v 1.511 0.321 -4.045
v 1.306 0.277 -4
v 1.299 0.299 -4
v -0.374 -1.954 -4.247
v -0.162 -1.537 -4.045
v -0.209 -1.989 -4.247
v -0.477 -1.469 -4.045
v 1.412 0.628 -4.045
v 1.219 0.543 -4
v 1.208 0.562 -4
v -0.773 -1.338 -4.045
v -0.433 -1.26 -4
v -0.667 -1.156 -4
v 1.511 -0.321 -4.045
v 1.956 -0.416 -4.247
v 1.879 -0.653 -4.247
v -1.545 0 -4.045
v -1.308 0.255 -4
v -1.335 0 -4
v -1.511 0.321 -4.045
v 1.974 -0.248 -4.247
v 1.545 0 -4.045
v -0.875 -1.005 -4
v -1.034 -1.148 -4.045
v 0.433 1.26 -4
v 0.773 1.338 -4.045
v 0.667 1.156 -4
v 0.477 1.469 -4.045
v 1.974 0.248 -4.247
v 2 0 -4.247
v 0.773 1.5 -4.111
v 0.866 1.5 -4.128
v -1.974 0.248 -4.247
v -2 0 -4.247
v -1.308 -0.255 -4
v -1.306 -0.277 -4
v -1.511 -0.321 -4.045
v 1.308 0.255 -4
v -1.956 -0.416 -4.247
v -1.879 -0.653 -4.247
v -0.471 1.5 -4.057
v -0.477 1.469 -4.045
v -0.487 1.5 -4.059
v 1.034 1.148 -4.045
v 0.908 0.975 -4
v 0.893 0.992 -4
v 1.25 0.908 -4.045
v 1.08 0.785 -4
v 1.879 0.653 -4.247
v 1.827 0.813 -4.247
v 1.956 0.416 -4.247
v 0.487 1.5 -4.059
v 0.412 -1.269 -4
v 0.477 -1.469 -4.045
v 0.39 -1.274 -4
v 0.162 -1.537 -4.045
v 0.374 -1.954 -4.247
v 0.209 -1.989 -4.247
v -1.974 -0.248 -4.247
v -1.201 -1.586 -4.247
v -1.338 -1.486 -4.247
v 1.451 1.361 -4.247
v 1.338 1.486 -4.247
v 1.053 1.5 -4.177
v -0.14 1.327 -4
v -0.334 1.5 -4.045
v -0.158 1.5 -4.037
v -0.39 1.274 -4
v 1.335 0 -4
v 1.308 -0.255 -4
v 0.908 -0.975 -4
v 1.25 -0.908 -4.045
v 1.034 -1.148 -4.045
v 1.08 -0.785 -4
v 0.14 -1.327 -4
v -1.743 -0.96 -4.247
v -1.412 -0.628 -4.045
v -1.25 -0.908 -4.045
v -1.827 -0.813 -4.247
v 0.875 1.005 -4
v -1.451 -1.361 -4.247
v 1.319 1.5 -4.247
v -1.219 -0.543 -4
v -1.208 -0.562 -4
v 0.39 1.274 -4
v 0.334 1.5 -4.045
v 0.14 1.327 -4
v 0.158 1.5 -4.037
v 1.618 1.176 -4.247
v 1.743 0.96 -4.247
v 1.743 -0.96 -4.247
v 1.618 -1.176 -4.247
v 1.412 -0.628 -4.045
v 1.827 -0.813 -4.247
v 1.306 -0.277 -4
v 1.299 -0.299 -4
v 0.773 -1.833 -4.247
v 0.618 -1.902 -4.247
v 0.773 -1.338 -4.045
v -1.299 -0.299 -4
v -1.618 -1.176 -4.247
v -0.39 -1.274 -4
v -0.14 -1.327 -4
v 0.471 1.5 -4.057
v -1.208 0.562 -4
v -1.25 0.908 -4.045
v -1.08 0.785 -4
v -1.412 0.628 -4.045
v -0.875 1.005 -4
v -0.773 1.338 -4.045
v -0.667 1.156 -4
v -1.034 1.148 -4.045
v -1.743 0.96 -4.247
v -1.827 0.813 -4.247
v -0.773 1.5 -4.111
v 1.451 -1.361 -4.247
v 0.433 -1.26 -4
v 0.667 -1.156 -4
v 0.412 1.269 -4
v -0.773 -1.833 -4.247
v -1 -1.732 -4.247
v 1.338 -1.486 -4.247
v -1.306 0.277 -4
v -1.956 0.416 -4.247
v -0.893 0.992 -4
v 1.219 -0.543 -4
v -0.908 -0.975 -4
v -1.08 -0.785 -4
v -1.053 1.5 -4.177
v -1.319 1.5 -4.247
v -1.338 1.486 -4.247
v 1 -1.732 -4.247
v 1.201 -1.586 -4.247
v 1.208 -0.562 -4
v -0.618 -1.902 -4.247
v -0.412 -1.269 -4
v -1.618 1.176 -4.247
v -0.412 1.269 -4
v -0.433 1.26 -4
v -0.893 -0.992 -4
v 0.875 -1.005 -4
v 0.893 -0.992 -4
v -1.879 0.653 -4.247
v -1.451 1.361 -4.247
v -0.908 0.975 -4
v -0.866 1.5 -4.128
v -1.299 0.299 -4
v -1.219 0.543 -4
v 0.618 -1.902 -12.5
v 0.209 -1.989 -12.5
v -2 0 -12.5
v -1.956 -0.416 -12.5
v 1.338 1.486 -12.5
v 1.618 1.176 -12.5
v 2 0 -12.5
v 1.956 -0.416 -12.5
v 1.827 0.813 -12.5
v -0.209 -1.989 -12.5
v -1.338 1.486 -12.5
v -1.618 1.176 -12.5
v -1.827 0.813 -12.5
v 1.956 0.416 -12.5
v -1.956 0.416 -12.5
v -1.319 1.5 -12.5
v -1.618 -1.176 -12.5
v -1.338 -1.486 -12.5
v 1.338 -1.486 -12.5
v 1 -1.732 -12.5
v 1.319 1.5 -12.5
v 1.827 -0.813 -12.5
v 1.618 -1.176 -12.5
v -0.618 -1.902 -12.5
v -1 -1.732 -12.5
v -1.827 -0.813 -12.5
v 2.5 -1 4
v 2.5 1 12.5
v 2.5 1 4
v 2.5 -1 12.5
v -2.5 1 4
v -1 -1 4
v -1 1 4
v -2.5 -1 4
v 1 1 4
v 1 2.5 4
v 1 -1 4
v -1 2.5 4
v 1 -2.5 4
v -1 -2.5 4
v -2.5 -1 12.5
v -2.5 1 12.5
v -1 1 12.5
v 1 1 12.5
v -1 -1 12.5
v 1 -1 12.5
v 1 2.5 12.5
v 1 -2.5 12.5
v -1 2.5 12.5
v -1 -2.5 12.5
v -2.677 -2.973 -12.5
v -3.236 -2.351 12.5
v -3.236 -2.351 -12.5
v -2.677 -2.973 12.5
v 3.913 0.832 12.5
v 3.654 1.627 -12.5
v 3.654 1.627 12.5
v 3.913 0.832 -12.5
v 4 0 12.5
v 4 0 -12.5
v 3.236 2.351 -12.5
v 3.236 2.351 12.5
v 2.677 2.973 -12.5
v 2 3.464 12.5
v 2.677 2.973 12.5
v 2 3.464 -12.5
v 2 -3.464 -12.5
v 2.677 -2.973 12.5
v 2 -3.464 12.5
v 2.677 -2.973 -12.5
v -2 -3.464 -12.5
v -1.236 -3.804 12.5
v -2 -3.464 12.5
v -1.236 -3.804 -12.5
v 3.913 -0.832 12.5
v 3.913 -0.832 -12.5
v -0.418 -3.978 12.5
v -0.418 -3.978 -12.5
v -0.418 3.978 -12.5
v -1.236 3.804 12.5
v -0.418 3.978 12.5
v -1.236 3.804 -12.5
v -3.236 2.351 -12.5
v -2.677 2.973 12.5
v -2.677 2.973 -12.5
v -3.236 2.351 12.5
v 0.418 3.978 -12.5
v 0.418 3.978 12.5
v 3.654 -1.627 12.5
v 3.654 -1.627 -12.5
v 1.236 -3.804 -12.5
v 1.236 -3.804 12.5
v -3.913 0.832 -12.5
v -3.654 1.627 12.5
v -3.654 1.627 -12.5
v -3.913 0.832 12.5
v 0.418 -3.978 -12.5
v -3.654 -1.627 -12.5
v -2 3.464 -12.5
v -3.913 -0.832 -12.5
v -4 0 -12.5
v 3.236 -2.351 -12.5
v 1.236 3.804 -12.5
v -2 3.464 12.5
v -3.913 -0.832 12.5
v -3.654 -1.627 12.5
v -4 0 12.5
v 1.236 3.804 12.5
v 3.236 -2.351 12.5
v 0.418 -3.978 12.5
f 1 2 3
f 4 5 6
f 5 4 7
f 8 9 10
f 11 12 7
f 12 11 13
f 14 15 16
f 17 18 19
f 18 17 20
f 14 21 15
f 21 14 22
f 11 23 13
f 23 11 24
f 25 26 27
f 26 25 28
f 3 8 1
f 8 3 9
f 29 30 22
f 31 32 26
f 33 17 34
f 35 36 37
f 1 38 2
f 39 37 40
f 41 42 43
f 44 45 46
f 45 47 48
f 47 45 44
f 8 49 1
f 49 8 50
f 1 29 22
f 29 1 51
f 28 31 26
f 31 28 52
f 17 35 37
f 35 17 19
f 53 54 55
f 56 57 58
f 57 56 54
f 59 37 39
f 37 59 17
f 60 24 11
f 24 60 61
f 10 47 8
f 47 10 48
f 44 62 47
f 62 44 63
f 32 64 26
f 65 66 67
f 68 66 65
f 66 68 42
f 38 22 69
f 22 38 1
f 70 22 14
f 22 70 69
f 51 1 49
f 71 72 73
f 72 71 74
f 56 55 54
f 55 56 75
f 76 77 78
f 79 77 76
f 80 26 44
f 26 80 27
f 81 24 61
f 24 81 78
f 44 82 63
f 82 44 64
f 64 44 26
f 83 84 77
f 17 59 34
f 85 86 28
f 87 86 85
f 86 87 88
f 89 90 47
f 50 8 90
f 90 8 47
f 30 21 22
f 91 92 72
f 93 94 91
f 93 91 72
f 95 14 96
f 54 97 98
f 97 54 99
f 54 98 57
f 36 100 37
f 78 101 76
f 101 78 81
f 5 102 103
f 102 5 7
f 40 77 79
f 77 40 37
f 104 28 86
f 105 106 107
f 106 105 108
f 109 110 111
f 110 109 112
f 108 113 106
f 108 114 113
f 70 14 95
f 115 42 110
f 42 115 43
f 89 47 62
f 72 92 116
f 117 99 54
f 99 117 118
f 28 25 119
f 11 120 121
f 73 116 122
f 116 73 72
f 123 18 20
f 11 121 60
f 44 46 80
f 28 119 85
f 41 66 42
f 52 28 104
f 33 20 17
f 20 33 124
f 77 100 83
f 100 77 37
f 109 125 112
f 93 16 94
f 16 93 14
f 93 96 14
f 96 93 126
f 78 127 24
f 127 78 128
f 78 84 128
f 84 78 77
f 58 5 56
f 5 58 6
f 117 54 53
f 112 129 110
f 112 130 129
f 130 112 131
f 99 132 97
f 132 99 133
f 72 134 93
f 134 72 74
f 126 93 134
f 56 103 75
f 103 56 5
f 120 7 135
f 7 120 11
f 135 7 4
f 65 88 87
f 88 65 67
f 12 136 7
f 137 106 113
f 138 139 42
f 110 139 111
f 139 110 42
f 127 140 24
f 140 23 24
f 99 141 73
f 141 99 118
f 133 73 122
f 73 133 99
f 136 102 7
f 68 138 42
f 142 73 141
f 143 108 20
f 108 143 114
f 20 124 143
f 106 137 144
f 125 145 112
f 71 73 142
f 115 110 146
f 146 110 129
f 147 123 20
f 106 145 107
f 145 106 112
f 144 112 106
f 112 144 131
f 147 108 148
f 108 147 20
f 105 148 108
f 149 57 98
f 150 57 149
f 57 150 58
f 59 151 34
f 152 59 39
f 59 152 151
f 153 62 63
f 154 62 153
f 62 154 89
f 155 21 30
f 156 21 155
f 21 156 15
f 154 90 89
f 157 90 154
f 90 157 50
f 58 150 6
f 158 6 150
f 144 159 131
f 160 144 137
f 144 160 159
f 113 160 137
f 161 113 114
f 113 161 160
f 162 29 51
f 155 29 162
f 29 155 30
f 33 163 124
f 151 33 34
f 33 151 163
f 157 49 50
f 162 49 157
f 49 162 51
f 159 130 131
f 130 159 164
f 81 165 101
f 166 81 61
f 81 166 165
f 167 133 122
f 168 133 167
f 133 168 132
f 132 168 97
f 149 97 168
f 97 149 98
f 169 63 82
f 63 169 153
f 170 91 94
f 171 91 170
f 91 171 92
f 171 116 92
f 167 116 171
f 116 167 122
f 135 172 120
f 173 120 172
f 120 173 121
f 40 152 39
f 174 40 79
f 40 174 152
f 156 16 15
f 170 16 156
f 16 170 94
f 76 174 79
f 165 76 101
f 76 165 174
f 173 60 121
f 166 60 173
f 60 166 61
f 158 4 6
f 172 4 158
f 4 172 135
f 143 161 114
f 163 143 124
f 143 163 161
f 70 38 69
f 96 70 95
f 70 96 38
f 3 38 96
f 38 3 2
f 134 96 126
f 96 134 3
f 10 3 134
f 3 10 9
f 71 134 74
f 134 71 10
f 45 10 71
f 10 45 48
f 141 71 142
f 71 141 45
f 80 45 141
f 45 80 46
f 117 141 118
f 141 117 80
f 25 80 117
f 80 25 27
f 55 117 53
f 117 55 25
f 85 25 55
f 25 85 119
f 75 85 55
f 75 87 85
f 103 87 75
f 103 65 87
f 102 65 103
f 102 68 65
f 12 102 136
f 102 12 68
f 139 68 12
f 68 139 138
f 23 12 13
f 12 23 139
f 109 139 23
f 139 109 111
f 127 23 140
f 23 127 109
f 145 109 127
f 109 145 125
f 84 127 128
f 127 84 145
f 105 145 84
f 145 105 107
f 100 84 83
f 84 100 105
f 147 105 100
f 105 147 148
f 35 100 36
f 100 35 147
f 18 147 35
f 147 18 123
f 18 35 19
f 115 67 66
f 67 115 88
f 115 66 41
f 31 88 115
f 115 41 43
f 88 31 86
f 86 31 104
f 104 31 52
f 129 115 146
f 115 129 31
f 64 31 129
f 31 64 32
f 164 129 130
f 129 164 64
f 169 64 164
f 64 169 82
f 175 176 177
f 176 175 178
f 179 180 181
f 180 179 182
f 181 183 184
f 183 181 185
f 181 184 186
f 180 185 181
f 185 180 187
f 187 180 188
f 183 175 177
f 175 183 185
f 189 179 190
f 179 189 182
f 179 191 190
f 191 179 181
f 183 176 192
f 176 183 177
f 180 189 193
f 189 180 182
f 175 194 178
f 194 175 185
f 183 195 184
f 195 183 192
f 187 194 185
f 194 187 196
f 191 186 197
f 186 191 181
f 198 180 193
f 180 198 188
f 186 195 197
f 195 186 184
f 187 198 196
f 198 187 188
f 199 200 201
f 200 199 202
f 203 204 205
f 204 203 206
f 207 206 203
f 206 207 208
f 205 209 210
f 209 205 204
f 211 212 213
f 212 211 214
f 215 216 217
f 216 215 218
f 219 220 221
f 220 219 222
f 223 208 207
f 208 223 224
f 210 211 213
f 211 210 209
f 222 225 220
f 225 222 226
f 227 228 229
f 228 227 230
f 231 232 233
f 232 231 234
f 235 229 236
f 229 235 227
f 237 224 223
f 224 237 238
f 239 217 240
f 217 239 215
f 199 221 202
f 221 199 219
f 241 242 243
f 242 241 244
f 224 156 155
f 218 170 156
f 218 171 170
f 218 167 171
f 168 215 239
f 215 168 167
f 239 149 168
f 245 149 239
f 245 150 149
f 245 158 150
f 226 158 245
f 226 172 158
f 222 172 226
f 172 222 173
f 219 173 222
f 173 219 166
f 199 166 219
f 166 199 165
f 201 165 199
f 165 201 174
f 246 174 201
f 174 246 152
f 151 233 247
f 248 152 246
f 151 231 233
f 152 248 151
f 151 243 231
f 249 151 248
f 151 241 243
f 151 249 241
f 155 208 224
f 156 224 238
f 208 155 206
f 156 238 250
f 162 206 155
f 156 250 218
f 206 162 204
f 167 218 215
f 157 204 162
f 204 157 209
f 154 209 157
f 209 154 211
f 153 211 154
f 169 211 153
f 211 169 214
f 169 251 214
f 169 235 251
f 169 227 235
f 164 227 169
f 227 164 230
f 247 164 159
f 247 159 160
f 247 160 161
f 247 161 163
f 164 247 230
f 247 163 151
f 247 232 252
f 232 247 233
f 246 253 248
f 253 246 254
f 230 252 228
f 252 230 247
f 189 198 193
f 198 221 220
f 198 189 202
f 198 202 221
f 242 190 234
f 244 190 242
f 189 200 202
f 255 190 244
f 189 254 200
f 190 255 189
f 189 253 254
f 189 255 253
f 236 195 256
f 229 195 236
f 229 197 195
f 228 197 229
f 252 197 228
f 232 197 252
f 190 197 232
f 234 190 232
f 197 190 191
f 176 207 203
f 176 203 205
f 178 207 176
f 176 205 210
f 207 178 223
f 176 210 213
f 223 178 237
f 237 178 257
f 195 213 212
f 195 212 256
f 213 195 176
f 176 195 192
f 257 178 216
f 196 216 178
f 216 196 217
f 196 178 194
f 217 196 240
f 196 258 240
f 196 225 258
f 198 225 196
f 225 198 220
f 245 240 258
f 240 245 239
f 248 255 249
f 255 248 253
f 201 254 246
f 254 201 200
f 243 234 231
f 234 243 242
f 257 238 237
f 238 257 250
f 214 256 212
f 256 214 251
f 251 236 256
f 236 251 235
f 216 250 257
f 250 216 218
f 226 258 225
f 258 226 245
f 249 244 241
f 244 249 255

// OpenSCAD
// file: ../../external/Openscad_Lego-Like_brick/block-remix.scad
// original from: http://www.thingiverse.com/thing:5699
// edited 2/24/11 3:29 PM 

// my derivation (made around 2011-06-21)
// added hollow_knob parameter to make knobs hollow
// added circular_hole parameter to make circular holes like in standard Technic plates
// added flat_top parameter to get rid of the knobs and add a groove to the bottom, so that the blocks could be separated
// 1xN and Nx1 bricks have their no pins when reinforcement==false

// EXAMPLES:
//   standard LEGO 2x1 tile has no pin
//      block(1,2,1/3,reinforcement=false,flat_top=true);
//   standard LEGO 2x1 flat has pin
//      block(1,2,1/3,reinforcement=true);
//   standard LEGO 2x1 brick has pin
//      block(1,2,1,reinforcement=true);
//   standard LEGO 2x1 brick without pin
//      block(1,2,1,reinforcement=false);
//   standard LEGO 2x1x5 brick has no pin and has hollow knobs
//      block(1,2,5,reinforcement=false,hollow_knob=true);


knob_diameter=4.8;		//knobs on top of blocks
knob_height=2;
knob_spacing=8.0;
wall_thickness=1.45;
roof_thickness=1.05;
block_height=9.5;
pin_diameter=3;		//pin for bottom blocks with width or length of 1
post_diameter=6.5;
reinforcing_width=1.5;
axle_spline_width=2.0;
axle_diameter=5;
cylinder_precision=0.5;

//* EXAMPLES: remove one slash from the beginning of this line to comment out the examples

block(2,1,1/3,axle_hole=false,circular_hole=true,reinforcement=true,hollow_knob=true,flat_top=true);

translate([50,-10,0])
	block(1,2,1/3,axle_hole=false,circular_hole=true,reinforcement=false,hollow_knob=true,flat_top=true);

translate([10,0,0])
	block(2,2,1/3,axle_hole=false,circular_hole=true,reinforcement=true,hollow_knob=true,flat_top=true);
translate([30,0,0])
	block(2,2,1/3,axle_hole=false,circular_hole=true,reinforcement=true,hollow_knob=false,flat_top=false);
translate([50,0,0])
	block(2,2,1/3,axle_hole=false,circular_hole=true,reinforcement=true,hollow_knob=true,flat_top=false);
translate([0,20,0])
	block(3,2,2/3,axle_hole=false,circular_hole=true,reinforcement=true,hollow_knob=true,flat_top=false);
translate([20,20,0])
	block(3,2,1,axle_hole=true,circular_hole=false,reinforcement=true,hollow_knob=false,flat_top=false);
translate([40,20,0])
	block(3,2,1/3,axle_hole=false,circular_hole=false,reinforcement=false,hollow_knob=false,flat_top=false);
translate([0,-10,0])
	block(1,5,1/3,axle_hole=true,circular_hole=false,reinforcement=true,hollow_knob=false,flat_top=false);
translate([0,-20,0])
	block(1,5,1/3,axle_hole=true,circular_hole=false,reinforcement=true,hollow_knob=true,flat_top=false);
translate([0,-30,0])
	block(1,5,1/3,axle_hole=true,circular_hole=false,reinforcement=true,hollow_knob=true,flat_top=true);
//*/

module block(width,length,height,axle_hole,reinforcement) {
	overall_length=(length-1)*knob_spacing+knob_diameter+wall_thickness*2;
	overall_width=(width-1)*knob_spacing+knob_diameter+wall_thickness*2;
	union() {
		difference() {
			union() {
				// body:
				cube([overall_length,overall_width,height*block_height]);
				// knobs:
				if (flat_top != true)
				translate([knob_diameter/2+wall_thickness,knob_diameter/2+wall_thickness,0]) 
					for (ycount=[0:width-1])
						for (xcount=[0:length-1]) {
							translate([xcount*knob_spacing,ycount*knob_spacing,0])
								difference() {
									cylinder(r=knob_diameter/2,h=block_height*height+knob_height,$fs=cylinder_precision);
									if (hollow_knob==true)
										translate([0,0,-roof_thickness])
											cylinder(r=pin_diameter/2,h=block_height*height+knob_height+2*roof_thickness,$fs=cylinder_precision);
								}
					}
			}
			// hollow bottom:
			translate([wall_thickness,wall_thickness,-roof_thickness]) cube([overall_length-wall_thickness*2,overall_width-wall_thickness*2,block_height*height]);
			// flat_top -> groove around bottom
			if (flat_top == true) {
				translate([-wall_thickness/2,-wall_thickness*2/3,-wall_thickness/2])
					cube([overall_length+wall_thickness,wall_thickness,wall_thickness]);
				translate([-wall_thickness/2,overall_width-wall_thickness/3,-wall_thickness/2])
					cube([overall_length+wall_thickness,wall_thickness,wall_thickness]);
	
				translate([-wall_thickness*2/3,-wall_thickness/2,-wall_thickness/2])
					cube([wall_thickness,overall_width+wall_thickness,wall_thickness]);
				translate([overall_length-wall_thickness/3,0,-wall_thickness/2])
					cube([wall_thickness,overall_width+wall_thickness,wall_thickness]);
			}
			if (axle_hole==true)
				if (width>1 && length>1) for (ycount=[1:width-1])
					for (xcount=[1:length-1])
						translate([xcount*knob_spacing,ycount*knob_spacing,roof_thickness])  axle(height);
			if (circular_hole==true)
				if (width>1 && length>1) for (ycount=[1:width-1])
					for (xcount=[1:length-1])
						translate([xcount*knob_spacing,ycount*knob_spacing,roof_thickness])
							cylinder(r=knob_diameter/2, h=height*block_height+roof_thickness/4,$fs=cylinder_precision);
		}

		if (reinforcement==true && width>1 && length>1)
			difference() {
				for (ycount=[1:width-1])
					for (xcount=[1:length-1])
						translate([xcount*knob_spacing,ycount*knob_spacing,0]) reinforcement(height);
				for (ycount=[1:width-1])
					for (xcount=[1:length-1])
						translate([xcount*knob_spacing,ycount*knob_spacing,-roof_thickness/2]) cylinder(r=knob_diameter/2, h=height*block_height+roof_thickness, $fs=cylinder_precision);
			}
		// posts:
		if (width>1 && length>1) for (ycount=[1:width-1])
			for (xcount=[1:length-1])
				translate([xcount*knob_spacing,ycount*knob_spacing,0]) post(height);

		if (reinforcement == true && width==1 && length!=1)
			for (xcount=[1:length-1])
				translate([xcount*knob_spacing,overall_width/2,0]) cylinder(r=pin_diameter/2,h=block_height*height,$fs=cylinder_precision);

		if (reinforcement == true && length==1 && width!=1)
			for (ycount=[1:width-1])
				translate([overall_length/2,ycount*knob_spacing,0]) cylinder(r=pin_diameter/2,h=block_height*height,$fs=cylinder_precision);
	}
}

module post(height) {
	difference() {
		cylinder(r=post_diameter/2, h=height*block_height-roof_thickness/2,$fs=cylinder_precision);
		translate([0,0,-roof_thickness/2])
			cylinder(r=knob_diameter/2, h=height*block_height+roof_thickness/4,$fs=cylinder_precision);
	}
}

module reinforcement(height) {
	union() {
		translate([0,0,height*block_height/2]) union() {
			cube([reinforcing_width,knob_spacing+knob_diameter+wall_thickness/2,height*block_height-roof_thickness/2],center=true);
			rotate(v=[0,0,1],a=90) cube([reinforcing_width,knob_spacing+knob_diameter+wall_thickness/2,height*block_height-roof_thickness/2], center=true);
		}
	}
}

module axle(height) {
	translate([0,0,height*block_height/2]) union() {
		cube([axle_diameter,axle_spline_width,height*block_height],center=true);
		cube([axle_spline_width,axle_diameter,height*block_height],center=true);
	}
}
			
// file: ../../modules/motors/micro-motors-l149.scad
module motorMicroMotorsL149(length) {	
	difference() {
		union() {
			color("grey") cylinder(h = 1, r = 8.5 / 2);
			color("grey") translate(v = [0, 0, 1]) cylinder(h = 21, r = 27 / 2);
			color("black")
			intersection() {
				translate(v = [0, 0, 21 + 1]) cylinder(h = length - 21, r = 27 / 2);
				translate(v = [0, 0, length - 14]) sphere(19.5);
			}
			color("black")
			translate(v = [0, 0, length + 1]) cylinder(h = 4.5, r = 9 / 2);
			intersection() {
				color("silver")
				translate(v = [0, 0, length + 5.5]) cylinder(h = 11, r = 4 / 2);
				color("silver")
				union() {
					translate(v = [0, 0, length + 11.7]) sphere(5);
					translate(v = [- 10 / 2, - 10 / 2, length + 4 ]) cube([10, 10, 6]);
				}
			}				
		}
		color("silver")
		translate(v = [- 5 / 2, 1.5, length + 8 - 0.1]) cube([5, 5, 8.5 + 0.2]);
		color("silver")
		translate(v = [0, 10, length + 1 - 4])  cylinder(h = 4.1, r = 3/2);
		color("silver")
		translate(v = [0, - 10, length + 1 - 4])  cylinder(h = 4.1, r = 3/2);
	}
}

module motorMicroMotorsL149_4_6_12__10() {
	motorMicroMotorsL149(36);
}

module motorMicroMotorsL149_4_6_12__21() {
	motorMicroMotorsL149(36);
}

module motorMicroMotorsL149_4_6_12__43() {
	motorMicroMotorsL149(41);
}

module motorMicroMotorsL149_4_6_12__90() {
	motorMicroMotorsL149(41);
}

module motorMicroMotorsL149_4_6_12__188() {
	motorMicroMotorsL149(46);
}

module motorMicroMotorsL149_4_6_12__392() {
	motorMicroMotorsL149(46);
}

//examples

translate(v = [40 * 00, 0, 0]) motorMicroMotorsL149_4_6_12__10();
translate(v = [40 * 01, 0, 0]) motorMicroMotorsL149_4_6_12__21();
translate(v = [40 * 02, 0, 0]) motorMicroMotorsL149_4_6_12__43();
translate(v = [40 * 03, 0, 0]) motorMicroMotorsL149_4_6_12__90();	
translate(v = [40 * 04, 0, 0]) motorMicroMotorsL149_4_6_12__188();
translate(v = [40 * 05, 0, 0]) motorMicroMotorsL149_4_6_12__392();		
// main file
use <../../modules/motors/micro-motors-l149.scad>;
use <../../external/Openscad_Lego-Like_brick/block-remix.scad>;

$fn=30;

module motorMicroMotorsL149LegoAdapter() {
	height = 25;
	thickness = 4;

	difference() {
		translate([0, 0, -height / 2 ]) cylinder(h= height, r = 4);
		translate([0, 0, -52.5 - thickness]) motorMicroMotorsL149_4_6_12__10();
		translate([0, 0, thickness]) axle(3);
	}
}


motorMicroMotorsL149LegoAdapter();
